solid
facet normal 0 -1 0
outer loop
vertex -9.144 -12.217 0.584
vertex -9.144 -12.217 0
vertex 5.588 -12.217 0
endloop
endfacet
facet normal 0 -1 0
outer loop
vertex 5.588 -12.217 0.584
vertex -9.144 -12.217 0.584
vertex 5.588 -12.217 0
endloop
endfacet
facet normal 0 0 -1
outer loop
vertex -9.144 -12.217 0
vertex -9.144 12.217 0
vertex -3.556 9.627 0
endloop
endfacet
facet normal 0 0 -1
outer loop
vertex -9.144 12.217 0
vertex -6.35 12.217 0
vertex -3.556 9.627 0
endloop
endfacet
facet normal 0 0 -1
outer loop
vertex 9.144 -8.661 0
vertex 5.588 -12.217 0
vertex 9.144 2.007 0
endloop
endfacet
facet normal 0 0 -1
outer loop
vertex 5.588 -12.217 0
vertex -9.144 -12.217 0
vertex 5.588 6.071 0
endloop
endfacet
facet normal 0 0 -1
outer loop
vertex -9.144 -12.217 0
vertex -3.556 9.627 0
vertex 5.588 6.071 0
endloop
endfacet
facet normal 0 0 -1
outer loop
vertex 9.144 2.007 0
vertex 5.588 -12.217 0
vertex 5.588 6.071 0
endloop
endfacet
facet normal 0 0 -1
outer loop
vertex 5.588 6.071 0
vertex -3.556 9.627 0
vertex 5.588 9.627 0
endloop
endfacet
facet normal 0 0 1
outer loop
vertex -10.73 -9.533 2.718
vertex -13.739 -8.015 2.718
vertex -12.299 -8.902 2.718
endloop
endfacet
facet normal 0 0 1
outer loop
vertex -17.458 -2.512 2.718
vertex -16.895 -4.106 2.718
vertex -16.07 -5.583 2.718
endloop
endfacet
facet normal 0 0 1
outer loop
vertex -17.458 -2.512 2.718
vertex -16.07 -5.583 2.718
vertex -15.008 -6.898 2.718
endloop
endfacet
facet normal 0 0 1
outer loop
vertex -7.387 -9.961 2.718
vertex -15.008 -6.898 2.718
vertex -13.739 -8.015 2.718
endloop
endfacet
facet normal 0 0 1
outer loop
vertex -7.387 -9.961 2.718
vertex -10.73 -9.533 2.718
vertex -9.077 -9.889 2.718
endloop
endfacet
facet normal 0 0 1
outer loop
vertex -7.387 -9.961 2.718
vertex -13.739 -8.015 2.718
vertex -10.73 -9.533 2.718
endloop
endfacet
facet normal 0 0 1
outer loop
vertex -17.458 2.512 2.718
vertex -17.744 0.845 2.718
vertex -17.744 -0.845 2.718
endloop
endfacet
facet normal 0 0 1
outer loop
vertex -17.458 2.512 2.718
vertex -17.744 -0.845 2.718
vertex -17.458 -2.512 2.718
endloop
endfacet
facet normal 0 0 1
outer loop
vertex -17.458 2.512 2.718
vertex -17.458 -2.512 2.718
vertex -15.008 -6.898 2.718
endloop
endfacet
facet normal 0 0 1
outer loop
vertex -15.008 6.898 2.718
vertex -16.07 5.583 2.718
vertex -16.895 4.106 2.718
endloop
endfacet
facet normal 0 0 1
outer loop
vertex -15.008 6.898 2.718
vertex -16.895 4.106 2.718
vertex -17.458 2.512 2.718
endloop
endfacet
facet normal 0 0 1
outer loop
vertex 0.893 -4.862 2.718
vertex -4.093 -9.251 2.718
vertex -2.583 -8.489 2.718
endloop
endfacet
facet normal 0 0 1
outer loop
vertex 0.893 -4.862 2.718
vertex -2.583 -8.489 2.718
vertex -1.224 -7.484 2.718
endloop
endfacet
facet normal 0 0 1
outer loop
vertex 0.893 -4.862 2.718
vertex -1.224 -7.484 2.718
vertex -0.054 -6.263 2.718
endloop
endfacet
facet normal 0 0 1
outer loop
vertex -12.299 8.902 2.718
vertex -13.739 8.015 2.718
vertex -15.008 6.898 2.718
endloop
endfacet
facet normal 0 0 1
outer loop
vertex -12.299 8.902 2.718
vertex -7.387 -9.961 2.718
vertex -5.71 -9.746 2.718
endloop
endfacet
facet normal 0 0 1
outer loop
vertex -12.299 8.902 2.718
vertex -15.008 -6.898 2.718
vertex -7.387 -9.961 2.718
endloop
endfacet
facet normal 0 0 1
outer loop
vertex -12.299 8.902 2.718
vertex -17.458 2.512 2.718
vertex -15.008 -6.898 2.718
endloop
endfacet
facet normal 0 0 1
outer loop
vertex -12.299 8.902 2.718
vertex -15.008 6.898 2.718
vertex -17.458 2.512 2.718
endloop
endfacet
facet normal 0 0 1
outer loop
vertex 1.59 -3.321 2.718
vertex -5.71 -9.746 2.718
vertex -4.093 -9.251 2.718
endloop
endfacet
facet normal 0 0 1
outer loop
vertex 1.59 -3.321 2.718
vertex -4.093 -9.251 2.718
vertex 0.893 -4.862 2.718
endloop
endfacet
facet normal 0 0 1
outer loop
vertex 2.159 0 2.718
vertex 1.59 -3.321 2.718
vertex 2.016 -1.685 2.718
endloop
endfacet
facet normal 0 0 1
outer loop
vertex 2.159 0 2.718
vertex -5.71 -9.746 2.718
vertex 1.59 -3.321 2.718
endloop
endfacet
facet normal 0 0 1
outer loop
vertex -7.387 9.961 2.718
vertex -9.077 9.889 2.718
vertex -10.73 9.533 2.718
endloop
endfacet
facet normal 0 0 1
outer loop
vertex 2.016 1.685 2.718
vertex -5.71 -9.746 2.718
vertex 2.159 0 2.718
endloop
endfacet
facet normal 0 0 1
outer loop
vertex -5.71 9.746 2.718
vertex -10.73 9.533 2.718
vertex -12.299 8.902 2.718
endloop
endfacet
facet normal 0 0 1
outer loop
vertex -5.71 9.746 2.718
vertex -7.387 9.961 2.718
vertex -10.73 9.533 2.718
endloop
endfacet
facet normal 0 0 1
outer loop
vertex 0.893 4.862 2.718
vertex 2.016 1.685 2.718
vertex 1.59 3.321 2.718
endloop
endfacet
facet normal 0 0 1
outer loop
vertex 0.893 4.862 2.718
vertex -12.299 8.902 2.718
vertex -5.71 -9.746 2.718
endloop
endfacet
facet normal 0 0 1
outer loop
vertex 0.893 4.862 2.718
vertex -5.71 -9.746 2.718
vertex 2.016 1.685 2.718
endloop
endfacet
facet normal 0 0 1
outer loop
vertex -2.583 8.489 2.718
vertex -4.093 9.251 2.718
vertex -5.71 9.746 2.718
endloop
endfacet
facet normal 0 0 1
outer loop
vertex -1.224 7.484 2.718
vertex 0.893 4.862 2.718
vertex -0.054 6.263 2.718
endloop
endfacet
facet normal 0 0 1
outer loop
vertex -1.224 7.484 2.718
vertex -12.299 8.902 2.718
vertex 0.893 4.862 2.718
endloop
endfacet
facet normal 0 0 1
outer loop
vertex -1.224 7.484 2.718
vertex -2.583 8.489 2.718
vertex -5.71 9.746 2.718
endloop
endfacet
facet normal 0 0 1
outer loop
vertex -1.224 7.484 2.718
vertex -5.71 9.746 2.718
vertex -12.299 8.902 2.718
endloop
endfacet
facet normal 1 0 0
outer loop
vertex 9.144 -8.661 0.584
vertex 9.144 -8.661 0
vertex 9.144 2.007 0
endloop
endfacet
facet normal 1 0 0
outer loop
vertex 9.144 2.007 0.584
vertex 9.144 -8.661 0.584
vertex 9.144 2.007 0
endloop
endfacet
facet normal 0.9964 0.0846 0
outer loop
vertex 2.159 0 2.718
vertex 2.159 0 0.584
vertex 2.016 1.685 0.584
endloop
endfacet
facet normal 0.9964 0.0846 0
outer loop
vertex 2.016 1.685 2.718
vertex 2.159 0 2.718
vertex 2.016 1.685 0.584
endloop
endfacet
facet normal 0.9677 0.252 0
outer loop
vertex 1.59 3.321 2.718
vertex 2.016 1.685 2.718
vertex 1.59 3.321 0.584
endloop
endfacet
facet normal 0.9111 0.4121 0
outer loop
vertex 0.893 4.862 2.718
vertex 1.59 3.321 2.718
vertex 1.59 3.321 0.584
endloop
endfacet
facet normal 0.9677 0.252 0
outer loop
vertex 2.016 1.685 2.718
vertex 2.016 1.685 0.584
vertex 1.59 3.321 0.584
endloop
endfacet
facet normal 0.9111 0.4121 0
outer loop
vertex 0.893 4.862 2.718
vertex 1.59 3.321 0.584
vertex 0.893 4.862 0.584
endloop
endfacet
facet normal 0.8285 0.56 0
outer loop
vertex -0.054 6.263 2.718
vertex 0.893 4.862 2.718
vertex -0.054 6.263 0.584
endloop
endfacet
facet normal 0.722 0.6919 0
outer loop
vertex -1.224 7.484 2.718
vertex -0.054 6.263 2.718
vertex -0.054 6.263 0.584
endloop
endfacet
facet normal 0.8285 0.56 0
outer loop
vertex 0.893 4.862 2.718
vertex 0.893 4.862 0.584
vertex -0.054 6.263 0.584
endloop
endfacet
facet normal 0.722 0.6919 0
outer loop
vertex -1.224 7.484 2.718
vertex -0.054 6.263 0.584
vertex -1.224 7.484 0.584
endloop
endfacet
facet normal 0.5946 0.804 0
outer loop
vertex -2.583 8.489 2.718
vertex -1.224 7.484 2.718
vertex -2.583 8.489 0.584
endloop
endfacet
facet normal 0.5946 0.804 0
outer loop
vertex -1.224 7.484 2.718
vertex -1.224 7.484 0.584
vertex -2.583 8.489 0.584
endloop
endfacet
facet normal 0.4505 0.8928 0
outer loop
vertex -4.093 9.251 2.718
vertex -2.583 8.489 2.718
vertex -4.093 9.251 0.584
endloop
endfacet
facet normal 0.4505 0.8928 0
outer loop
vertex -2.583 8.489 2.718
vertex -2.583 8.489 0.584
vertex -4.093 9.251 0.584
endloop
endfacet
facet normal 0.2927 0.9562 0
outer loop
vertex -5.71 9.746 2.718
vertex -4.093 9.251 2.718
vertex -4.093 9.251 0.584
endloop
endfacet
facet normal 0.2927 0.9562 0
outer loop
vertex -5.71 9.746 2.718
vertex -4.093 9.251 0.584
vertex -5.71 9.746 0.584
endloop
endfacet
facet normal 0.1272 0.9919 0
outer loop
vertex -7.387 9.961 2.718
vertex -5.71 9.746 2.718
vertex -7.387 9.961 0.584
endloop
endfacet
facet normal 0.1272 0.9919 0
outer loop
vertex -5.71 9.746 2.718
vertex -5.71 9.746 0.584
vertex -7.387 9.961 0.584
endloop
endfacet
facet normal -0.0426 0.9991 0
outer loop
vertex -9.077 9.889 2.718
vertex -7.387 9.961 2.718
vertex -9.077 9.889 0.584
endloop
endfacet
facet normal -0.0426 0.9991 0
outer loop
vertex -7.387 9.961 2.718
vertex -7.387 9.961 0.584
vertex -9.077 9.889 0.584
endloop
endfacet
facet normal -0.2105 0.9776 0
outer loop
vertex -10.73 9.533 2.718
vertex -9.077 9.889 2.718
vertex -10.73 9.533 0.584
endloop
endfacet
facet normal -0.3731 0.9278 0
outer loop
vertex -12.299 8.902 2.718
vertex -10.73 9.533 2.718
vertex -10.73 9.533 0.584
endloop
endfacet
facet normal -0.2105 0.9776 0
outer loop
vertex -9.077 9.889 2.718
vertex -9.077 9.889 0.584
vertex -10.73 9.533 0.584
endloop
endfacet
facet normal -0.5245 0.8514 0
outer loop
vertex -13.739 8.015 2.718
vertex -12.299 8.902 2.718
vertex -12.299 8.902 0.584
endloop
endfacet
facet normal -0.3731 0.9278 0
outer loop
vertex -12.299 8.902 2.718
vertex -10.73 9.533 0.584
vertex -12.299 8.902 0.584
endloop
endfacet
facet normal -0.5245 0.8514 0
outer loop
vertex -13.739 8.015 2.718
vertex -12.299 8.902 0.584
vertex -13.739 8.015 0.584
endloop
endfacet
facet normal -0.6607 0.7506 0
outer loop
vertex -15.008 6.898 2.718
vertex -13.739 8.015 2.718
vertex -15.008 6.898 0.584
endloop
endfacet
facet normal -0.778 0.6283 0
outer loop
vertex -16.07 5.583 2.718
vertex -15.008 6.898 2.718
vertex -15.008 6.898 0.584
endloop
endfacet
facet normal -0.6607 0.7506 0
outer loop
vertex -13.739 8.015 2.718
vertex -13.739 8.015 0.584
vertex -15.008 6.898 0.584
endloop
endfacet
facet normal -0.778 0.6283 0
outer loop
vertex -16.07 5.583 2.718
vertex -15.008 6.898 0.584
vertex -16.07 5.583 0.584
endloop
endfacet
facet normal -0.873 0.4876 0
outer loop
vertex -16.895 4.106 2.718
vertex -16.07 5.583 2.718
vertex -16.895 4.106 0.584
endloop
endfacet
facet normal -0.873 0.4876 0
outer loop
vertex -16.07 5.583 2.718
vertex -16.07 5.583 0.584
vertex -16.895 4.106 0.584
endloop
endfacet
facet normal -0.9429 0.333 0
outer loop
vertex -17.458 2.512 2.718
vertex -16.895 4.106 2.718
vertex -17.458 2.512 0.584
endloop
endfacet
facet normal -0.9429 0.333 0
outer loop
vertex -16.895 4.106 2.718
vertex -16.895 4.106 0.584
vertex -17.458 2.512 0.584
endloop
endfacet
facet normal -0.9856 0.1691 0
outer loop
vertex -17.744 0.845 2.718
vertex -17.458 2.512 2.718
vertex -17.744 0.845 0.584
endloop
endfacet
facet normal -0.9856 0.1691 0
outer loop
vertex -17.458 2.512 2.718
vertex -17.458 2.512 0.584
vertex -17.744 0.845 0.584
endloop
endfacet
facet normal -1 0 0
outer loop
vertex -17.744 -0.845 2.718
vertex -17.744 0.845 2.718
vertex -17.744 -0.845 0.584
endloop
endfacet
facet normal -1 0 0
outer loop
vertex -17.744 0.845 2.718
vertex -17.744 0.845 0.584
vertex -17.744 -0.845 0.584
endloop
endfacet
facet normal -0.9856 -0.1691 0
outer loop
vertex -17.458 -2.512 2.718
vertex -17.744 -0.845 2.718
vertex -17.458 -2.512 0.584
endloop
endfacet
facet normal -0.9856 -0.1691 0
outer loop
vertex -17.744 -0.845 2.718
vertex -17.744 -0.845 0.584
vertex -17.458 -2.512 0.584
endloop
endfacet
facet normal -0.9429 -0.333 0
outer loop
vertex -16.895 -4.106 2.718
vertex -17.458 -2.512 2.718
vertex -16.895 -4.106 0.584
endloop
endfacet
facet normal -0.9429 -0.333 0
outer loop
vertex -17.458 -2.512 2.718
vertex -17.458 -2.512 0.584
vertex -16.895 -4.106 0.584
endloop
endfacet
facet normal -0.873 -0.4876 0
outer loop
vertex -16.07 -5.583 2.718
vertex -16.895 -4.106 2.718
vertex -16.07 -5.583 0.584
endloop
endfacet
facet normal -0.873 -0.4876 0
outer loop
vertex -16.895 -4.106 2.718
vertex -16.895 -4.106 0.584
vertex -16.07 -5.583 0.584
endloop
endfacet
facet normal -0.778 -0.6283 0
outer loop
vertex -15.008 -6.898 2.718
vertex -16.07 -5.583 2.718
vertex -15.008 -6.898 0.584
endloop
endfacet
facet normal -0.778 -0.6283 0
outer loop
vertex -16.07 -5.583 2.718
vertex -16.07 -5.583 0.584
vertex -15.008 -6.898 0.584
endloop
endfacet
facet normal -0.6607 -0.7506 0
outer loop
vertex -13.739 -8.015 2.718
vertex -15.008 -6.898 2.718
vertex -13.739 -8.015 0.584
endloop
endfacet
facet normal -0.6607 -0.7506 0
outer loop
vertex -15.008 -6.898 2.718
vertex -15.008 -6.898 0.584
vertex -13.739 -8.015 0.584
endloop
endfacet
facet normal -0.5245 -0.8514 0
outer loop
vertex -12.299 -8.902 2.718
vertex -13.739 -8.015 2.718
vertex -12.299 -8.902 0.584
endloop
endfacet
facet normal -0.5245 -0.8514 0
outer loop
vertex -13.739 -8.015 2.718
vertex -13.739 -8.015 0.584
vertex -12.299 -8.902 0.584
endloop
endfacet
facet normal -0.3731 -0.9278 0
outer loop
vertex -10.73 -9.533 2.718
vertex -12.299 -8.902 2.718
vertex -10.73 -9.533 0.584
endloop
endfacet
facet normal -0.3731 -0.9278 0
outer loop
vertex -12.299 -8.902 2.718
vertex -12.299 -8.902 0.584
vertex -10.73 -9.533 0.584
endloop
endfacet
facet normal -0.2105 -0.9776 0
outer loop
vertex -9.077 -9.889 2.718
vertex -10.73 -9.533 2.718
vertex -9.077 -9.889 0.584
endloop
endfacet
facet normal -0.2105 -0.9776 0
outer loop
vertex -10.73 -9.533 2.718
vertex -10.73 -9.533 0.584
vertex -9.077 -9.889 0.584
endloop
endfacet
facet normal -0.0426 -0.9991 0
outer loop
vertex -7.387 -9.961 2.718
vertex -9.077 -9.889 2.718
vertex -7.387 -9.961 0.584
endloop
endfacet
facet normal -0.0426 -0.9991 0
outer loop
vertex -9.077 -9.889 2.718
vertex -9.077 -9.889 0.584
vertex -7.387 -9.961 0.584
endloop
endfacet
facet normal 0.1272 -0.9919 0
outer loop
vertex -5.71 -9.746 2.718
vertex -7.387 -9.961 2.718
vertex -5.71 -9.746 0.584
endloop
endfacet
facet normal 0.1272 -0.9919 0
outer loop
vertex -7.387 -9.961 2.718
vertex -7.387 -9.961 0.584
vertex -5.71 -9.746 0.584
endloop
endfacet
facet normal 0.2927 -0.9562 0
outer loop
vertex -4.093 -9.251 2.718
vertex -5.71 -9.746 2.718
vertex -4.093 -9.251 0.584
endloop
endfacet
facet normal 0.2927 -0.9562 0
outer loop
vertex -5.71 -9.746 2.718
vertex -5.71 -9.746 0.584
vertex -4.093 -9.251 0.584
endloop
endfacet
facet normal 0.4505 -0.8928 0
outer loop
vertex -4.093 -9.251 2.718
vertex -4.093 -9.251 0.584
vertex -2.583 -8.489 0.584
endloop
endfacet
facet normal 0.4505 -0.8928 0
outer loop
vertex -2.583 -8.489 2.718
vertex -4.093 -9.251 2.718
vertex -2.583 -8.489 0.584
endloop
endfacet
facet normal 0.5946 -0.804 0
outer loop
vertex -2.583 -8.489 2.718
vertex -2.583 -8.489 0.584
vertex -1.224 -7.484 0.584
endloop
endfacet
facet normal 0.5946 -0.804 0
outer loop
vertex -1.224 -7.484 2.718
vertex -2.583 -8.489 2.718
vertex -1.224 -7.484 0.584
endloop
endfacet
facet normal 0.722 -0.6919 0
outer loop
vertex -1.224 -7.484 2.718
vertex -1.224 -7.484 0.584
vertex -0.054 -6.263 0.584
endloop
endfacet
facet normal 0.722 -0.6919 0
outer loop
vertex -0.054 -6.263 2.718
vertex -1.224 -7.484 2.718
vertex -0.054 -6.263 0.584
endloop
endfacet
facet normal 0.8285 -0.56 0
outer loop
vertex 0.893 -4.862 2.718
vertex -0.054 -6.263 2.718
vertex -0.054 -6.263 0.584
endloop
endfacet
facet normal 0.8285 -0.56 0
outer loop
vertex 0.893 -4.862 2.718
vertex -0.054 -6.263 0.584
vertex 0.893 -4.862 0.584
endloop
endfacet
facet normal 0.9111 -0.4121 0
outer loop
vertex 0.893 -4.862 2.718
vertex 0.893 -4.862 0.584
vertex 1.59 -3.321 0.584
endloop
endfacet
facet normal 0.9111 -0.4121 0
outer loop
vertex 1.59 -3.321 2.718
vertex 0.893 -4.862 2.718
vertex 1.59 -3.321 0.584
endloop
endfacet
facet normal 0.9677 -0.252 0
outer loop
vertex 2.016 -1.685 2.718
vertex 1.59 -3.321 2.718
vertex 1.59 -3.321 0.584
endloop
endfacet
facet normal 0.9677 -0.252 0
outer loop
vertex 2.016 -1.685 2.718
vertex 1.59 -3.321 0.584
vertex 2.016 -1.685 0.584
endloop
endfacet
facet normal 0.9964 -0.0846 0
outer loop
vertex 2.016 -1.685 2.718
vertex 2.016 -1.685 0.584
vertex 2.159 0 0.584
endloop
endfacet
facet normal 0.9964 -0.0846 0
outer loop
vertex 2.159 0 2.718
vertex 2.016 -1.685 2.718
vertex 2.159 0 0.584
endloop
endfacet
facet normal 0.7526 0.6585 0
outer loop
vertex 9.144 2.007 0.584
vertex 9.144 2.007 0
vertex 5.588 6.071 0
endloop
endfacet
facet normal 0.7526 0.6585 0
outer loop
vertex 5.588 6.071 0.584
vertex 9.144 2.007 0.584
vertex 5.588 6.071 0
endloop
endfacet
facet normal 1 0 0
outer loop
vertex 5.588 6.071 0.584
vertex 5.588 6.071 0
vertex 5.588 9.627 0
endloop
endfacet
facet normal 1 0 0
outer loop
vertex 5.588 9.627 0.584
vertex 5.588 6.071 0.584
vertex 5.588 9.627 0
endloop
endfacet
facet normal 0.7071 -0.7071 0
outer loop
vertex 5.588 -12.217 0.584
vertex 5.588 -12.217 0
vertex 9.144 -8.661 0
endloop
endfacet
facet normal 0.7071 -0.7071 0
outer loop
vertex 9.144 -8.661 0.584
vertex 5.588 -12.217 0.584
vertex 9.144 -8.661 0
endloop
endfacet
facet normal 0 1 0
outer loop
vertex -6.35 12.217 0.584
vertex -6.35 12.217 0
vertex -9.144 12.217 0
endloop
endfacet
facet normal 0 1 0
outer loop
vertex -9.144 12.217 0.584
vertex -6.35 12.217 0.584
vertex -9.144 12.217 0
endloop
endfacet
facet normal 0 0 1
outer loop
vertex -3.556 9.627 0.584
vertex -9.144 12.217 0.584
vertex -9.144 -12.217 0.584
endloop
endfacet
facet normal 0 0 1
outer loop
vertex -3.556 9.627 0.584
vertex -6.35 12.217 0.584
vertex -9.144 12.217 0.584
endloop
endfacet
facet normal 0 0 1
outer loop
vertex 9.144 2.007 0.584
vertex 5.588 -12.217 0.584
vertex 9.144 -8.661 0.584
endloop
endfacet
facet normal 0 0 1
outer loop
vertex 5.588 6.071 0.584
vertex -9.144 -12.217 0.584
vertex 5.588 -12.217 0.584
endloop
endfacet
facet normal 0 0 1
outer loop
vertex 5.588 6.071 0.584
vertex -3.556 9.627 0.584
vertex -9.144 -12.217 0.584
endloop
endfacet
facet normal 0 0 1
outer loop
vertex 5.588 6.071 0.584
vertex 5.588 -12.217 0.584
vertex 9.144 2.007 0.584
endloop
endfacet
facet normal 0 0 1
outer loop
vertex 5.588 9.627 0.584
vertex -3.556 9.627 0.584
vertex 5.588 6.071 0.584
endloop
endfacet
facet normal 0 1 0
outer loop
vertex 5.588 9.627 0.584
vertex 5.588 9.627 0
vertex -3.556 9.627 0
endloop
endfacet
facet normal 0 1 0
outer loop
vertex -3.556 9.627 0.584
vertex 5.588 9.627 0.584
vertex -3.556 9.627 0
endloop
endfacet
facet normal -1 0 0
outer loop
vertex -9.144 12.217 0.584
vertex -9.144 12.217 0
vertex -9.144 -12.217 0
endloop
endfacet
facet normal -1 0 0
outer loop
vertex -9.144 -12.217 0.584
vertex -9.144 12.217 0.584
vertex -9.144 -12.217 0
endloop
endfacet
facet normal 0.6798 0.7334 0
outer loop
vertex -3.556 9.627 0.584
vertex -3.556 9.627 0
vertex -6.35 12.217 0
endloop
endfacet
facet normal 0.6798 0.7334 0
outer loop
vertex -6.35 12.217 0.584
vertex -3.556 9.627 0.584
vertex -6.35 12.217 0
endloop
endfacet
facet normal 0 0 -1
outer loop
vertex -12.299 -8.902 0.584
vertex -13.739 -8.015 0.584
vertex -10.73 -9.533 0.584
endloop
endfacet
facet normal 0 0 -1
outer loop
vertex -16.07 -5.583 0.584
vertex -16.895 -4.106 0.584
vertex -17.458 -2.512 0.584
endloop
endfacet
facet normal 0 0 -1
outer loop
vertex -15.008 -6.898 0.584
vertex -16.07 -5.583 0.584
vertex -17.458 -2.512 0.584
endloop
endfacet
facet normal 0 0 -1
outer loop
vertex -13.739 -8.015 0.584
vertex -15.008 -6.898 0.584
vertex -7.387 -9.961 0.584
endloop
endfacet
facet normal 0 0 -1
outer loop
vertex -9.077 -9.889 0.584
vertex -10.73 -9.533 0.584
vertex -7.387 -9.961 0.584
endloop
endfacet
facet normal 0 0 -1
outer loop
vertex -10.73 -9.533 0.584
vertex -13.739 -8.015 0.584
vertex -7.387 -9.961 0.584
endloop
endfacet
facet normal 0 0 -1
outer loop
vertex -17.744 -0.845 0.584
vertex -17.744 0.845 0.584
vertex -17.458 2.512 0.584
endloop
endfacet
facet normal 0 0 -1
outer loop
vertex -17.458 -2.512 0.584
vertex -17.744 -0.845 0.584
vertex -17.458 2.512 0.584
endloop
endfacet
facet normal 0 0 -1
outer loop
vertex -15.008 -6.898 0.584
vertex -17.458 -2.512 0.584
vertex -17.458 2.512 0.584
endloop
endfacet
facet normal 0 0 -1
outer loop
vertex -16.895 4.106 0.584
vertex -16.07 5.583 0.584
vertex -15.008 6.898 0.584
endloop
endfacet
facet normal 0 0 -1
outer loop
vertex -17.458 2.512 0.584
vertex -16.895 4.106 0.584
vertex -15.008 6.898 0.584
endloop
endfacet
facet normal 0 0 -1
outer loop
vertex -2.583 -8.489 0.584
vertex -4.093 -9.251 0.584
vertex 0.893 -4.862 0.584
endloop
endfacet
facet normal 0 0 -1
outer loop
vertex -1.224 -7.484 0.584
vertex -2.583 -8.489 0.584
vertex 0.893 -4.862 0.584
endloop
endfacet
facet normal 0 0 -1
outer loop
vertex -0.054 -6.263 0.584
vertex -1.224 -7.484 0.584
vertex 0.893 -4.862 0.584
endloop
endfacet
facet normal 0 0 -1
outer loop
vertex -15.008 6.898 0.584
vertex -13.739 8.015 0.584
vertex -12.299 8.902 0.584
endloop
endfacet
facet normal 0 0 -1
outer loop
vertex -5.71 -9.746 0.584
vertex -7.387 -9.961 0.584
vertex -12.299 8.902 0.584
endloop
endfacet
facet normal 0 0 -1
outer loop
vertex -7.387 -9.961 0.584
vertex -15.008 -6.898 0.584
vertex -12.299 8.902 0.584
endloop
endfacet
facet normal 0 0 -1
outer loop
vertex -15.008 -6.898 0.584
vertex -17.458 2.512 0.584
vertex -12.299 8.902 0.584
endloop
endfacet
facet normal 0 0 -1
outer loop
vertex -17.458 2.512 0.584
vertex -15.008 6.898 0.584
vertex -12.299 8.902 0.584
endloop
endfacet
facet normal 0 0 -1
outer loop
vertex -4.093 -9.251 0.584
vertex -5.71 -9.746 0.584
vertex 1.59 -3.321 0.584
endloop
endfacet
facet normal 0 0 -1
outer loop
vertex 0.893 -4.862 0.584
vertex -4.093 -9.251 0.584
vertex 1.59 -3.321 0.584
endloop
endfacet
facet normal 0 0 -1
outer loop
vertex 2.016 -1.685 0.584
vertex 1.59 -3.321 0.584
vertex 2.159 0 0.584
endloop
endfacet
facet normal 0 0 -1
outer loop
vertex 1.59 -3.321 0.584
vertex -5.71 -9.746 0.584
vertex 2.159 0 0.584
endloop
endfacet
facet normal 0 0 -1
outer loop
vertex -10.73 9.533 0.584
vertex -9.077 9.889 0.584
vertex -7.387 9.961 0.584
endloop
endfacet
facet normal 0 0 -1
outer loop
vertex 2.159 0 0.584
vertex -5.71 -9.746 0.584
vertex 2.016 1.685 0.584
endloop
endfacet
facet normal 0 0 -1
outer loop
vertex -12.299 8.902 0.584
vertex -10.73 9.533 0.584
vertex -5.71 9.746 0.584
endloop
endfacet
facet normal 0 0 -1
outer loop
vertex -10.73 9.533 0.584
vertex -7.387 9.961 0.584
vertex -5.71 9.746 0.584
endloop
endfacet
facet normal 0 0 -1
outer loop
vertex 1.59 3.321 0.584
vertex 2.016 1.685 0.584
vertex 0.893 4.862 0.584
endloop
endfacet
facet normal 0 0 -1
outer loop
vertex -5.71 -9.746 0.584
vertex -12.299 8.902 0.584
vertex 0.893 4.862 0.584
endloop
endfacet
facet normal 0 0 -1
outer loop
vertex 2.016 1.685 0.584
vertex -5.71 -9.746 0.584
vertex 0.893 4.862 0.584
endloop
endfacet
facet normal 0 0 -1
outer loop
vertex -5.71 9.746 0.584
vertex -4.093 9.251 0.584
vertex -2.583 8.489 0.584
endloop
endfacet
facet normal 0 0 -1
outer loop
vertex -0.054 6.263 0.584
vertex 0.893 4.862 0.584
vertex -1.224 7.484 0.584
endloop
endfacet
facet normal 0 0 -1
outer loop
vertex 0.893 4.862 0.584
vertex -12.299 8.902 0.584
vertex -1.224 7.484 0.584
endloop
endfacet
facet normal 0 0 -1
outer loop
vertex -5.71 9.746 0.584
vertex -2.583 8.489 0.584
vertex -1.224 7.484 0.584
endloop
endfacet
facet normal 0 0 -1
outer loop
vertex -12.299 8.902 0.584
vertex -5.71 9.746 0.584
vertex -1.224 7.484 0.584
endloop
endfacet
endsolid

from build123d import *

# Parameters (mm, degrees)
F1_DEPTH = 0.5842
F2_R     = 9.9695
F3_DEPTH = 2.1336


with BuildPart() as f1:
    # F0 (on Top) → F1 (new body)
    with BuildSketch(Plane.XY):
        Polygon((-9.144, 12.2174), (-9.144, -12.2174), (5.588, -12.2174), (9.144, -8.6614), (9.144, 2.0066), (5.588, 6.0706), (5.588, 9.6266), (-3.556, 9.6266), (-6.35, 12.2174), align=None)
    extrude(amount=F1_DEPTH)


with BuildPart() as f3:
    # F2 (on face) → F3 (new body)
    with BuildSketch(Plane.XY.offset(0.5842)):
        with Locations((-7.8105, 0)):
            Circle(F2_R)
    extrude(amount=F3_DEPTH)


solid = Compound([f1.part, f3.part])
